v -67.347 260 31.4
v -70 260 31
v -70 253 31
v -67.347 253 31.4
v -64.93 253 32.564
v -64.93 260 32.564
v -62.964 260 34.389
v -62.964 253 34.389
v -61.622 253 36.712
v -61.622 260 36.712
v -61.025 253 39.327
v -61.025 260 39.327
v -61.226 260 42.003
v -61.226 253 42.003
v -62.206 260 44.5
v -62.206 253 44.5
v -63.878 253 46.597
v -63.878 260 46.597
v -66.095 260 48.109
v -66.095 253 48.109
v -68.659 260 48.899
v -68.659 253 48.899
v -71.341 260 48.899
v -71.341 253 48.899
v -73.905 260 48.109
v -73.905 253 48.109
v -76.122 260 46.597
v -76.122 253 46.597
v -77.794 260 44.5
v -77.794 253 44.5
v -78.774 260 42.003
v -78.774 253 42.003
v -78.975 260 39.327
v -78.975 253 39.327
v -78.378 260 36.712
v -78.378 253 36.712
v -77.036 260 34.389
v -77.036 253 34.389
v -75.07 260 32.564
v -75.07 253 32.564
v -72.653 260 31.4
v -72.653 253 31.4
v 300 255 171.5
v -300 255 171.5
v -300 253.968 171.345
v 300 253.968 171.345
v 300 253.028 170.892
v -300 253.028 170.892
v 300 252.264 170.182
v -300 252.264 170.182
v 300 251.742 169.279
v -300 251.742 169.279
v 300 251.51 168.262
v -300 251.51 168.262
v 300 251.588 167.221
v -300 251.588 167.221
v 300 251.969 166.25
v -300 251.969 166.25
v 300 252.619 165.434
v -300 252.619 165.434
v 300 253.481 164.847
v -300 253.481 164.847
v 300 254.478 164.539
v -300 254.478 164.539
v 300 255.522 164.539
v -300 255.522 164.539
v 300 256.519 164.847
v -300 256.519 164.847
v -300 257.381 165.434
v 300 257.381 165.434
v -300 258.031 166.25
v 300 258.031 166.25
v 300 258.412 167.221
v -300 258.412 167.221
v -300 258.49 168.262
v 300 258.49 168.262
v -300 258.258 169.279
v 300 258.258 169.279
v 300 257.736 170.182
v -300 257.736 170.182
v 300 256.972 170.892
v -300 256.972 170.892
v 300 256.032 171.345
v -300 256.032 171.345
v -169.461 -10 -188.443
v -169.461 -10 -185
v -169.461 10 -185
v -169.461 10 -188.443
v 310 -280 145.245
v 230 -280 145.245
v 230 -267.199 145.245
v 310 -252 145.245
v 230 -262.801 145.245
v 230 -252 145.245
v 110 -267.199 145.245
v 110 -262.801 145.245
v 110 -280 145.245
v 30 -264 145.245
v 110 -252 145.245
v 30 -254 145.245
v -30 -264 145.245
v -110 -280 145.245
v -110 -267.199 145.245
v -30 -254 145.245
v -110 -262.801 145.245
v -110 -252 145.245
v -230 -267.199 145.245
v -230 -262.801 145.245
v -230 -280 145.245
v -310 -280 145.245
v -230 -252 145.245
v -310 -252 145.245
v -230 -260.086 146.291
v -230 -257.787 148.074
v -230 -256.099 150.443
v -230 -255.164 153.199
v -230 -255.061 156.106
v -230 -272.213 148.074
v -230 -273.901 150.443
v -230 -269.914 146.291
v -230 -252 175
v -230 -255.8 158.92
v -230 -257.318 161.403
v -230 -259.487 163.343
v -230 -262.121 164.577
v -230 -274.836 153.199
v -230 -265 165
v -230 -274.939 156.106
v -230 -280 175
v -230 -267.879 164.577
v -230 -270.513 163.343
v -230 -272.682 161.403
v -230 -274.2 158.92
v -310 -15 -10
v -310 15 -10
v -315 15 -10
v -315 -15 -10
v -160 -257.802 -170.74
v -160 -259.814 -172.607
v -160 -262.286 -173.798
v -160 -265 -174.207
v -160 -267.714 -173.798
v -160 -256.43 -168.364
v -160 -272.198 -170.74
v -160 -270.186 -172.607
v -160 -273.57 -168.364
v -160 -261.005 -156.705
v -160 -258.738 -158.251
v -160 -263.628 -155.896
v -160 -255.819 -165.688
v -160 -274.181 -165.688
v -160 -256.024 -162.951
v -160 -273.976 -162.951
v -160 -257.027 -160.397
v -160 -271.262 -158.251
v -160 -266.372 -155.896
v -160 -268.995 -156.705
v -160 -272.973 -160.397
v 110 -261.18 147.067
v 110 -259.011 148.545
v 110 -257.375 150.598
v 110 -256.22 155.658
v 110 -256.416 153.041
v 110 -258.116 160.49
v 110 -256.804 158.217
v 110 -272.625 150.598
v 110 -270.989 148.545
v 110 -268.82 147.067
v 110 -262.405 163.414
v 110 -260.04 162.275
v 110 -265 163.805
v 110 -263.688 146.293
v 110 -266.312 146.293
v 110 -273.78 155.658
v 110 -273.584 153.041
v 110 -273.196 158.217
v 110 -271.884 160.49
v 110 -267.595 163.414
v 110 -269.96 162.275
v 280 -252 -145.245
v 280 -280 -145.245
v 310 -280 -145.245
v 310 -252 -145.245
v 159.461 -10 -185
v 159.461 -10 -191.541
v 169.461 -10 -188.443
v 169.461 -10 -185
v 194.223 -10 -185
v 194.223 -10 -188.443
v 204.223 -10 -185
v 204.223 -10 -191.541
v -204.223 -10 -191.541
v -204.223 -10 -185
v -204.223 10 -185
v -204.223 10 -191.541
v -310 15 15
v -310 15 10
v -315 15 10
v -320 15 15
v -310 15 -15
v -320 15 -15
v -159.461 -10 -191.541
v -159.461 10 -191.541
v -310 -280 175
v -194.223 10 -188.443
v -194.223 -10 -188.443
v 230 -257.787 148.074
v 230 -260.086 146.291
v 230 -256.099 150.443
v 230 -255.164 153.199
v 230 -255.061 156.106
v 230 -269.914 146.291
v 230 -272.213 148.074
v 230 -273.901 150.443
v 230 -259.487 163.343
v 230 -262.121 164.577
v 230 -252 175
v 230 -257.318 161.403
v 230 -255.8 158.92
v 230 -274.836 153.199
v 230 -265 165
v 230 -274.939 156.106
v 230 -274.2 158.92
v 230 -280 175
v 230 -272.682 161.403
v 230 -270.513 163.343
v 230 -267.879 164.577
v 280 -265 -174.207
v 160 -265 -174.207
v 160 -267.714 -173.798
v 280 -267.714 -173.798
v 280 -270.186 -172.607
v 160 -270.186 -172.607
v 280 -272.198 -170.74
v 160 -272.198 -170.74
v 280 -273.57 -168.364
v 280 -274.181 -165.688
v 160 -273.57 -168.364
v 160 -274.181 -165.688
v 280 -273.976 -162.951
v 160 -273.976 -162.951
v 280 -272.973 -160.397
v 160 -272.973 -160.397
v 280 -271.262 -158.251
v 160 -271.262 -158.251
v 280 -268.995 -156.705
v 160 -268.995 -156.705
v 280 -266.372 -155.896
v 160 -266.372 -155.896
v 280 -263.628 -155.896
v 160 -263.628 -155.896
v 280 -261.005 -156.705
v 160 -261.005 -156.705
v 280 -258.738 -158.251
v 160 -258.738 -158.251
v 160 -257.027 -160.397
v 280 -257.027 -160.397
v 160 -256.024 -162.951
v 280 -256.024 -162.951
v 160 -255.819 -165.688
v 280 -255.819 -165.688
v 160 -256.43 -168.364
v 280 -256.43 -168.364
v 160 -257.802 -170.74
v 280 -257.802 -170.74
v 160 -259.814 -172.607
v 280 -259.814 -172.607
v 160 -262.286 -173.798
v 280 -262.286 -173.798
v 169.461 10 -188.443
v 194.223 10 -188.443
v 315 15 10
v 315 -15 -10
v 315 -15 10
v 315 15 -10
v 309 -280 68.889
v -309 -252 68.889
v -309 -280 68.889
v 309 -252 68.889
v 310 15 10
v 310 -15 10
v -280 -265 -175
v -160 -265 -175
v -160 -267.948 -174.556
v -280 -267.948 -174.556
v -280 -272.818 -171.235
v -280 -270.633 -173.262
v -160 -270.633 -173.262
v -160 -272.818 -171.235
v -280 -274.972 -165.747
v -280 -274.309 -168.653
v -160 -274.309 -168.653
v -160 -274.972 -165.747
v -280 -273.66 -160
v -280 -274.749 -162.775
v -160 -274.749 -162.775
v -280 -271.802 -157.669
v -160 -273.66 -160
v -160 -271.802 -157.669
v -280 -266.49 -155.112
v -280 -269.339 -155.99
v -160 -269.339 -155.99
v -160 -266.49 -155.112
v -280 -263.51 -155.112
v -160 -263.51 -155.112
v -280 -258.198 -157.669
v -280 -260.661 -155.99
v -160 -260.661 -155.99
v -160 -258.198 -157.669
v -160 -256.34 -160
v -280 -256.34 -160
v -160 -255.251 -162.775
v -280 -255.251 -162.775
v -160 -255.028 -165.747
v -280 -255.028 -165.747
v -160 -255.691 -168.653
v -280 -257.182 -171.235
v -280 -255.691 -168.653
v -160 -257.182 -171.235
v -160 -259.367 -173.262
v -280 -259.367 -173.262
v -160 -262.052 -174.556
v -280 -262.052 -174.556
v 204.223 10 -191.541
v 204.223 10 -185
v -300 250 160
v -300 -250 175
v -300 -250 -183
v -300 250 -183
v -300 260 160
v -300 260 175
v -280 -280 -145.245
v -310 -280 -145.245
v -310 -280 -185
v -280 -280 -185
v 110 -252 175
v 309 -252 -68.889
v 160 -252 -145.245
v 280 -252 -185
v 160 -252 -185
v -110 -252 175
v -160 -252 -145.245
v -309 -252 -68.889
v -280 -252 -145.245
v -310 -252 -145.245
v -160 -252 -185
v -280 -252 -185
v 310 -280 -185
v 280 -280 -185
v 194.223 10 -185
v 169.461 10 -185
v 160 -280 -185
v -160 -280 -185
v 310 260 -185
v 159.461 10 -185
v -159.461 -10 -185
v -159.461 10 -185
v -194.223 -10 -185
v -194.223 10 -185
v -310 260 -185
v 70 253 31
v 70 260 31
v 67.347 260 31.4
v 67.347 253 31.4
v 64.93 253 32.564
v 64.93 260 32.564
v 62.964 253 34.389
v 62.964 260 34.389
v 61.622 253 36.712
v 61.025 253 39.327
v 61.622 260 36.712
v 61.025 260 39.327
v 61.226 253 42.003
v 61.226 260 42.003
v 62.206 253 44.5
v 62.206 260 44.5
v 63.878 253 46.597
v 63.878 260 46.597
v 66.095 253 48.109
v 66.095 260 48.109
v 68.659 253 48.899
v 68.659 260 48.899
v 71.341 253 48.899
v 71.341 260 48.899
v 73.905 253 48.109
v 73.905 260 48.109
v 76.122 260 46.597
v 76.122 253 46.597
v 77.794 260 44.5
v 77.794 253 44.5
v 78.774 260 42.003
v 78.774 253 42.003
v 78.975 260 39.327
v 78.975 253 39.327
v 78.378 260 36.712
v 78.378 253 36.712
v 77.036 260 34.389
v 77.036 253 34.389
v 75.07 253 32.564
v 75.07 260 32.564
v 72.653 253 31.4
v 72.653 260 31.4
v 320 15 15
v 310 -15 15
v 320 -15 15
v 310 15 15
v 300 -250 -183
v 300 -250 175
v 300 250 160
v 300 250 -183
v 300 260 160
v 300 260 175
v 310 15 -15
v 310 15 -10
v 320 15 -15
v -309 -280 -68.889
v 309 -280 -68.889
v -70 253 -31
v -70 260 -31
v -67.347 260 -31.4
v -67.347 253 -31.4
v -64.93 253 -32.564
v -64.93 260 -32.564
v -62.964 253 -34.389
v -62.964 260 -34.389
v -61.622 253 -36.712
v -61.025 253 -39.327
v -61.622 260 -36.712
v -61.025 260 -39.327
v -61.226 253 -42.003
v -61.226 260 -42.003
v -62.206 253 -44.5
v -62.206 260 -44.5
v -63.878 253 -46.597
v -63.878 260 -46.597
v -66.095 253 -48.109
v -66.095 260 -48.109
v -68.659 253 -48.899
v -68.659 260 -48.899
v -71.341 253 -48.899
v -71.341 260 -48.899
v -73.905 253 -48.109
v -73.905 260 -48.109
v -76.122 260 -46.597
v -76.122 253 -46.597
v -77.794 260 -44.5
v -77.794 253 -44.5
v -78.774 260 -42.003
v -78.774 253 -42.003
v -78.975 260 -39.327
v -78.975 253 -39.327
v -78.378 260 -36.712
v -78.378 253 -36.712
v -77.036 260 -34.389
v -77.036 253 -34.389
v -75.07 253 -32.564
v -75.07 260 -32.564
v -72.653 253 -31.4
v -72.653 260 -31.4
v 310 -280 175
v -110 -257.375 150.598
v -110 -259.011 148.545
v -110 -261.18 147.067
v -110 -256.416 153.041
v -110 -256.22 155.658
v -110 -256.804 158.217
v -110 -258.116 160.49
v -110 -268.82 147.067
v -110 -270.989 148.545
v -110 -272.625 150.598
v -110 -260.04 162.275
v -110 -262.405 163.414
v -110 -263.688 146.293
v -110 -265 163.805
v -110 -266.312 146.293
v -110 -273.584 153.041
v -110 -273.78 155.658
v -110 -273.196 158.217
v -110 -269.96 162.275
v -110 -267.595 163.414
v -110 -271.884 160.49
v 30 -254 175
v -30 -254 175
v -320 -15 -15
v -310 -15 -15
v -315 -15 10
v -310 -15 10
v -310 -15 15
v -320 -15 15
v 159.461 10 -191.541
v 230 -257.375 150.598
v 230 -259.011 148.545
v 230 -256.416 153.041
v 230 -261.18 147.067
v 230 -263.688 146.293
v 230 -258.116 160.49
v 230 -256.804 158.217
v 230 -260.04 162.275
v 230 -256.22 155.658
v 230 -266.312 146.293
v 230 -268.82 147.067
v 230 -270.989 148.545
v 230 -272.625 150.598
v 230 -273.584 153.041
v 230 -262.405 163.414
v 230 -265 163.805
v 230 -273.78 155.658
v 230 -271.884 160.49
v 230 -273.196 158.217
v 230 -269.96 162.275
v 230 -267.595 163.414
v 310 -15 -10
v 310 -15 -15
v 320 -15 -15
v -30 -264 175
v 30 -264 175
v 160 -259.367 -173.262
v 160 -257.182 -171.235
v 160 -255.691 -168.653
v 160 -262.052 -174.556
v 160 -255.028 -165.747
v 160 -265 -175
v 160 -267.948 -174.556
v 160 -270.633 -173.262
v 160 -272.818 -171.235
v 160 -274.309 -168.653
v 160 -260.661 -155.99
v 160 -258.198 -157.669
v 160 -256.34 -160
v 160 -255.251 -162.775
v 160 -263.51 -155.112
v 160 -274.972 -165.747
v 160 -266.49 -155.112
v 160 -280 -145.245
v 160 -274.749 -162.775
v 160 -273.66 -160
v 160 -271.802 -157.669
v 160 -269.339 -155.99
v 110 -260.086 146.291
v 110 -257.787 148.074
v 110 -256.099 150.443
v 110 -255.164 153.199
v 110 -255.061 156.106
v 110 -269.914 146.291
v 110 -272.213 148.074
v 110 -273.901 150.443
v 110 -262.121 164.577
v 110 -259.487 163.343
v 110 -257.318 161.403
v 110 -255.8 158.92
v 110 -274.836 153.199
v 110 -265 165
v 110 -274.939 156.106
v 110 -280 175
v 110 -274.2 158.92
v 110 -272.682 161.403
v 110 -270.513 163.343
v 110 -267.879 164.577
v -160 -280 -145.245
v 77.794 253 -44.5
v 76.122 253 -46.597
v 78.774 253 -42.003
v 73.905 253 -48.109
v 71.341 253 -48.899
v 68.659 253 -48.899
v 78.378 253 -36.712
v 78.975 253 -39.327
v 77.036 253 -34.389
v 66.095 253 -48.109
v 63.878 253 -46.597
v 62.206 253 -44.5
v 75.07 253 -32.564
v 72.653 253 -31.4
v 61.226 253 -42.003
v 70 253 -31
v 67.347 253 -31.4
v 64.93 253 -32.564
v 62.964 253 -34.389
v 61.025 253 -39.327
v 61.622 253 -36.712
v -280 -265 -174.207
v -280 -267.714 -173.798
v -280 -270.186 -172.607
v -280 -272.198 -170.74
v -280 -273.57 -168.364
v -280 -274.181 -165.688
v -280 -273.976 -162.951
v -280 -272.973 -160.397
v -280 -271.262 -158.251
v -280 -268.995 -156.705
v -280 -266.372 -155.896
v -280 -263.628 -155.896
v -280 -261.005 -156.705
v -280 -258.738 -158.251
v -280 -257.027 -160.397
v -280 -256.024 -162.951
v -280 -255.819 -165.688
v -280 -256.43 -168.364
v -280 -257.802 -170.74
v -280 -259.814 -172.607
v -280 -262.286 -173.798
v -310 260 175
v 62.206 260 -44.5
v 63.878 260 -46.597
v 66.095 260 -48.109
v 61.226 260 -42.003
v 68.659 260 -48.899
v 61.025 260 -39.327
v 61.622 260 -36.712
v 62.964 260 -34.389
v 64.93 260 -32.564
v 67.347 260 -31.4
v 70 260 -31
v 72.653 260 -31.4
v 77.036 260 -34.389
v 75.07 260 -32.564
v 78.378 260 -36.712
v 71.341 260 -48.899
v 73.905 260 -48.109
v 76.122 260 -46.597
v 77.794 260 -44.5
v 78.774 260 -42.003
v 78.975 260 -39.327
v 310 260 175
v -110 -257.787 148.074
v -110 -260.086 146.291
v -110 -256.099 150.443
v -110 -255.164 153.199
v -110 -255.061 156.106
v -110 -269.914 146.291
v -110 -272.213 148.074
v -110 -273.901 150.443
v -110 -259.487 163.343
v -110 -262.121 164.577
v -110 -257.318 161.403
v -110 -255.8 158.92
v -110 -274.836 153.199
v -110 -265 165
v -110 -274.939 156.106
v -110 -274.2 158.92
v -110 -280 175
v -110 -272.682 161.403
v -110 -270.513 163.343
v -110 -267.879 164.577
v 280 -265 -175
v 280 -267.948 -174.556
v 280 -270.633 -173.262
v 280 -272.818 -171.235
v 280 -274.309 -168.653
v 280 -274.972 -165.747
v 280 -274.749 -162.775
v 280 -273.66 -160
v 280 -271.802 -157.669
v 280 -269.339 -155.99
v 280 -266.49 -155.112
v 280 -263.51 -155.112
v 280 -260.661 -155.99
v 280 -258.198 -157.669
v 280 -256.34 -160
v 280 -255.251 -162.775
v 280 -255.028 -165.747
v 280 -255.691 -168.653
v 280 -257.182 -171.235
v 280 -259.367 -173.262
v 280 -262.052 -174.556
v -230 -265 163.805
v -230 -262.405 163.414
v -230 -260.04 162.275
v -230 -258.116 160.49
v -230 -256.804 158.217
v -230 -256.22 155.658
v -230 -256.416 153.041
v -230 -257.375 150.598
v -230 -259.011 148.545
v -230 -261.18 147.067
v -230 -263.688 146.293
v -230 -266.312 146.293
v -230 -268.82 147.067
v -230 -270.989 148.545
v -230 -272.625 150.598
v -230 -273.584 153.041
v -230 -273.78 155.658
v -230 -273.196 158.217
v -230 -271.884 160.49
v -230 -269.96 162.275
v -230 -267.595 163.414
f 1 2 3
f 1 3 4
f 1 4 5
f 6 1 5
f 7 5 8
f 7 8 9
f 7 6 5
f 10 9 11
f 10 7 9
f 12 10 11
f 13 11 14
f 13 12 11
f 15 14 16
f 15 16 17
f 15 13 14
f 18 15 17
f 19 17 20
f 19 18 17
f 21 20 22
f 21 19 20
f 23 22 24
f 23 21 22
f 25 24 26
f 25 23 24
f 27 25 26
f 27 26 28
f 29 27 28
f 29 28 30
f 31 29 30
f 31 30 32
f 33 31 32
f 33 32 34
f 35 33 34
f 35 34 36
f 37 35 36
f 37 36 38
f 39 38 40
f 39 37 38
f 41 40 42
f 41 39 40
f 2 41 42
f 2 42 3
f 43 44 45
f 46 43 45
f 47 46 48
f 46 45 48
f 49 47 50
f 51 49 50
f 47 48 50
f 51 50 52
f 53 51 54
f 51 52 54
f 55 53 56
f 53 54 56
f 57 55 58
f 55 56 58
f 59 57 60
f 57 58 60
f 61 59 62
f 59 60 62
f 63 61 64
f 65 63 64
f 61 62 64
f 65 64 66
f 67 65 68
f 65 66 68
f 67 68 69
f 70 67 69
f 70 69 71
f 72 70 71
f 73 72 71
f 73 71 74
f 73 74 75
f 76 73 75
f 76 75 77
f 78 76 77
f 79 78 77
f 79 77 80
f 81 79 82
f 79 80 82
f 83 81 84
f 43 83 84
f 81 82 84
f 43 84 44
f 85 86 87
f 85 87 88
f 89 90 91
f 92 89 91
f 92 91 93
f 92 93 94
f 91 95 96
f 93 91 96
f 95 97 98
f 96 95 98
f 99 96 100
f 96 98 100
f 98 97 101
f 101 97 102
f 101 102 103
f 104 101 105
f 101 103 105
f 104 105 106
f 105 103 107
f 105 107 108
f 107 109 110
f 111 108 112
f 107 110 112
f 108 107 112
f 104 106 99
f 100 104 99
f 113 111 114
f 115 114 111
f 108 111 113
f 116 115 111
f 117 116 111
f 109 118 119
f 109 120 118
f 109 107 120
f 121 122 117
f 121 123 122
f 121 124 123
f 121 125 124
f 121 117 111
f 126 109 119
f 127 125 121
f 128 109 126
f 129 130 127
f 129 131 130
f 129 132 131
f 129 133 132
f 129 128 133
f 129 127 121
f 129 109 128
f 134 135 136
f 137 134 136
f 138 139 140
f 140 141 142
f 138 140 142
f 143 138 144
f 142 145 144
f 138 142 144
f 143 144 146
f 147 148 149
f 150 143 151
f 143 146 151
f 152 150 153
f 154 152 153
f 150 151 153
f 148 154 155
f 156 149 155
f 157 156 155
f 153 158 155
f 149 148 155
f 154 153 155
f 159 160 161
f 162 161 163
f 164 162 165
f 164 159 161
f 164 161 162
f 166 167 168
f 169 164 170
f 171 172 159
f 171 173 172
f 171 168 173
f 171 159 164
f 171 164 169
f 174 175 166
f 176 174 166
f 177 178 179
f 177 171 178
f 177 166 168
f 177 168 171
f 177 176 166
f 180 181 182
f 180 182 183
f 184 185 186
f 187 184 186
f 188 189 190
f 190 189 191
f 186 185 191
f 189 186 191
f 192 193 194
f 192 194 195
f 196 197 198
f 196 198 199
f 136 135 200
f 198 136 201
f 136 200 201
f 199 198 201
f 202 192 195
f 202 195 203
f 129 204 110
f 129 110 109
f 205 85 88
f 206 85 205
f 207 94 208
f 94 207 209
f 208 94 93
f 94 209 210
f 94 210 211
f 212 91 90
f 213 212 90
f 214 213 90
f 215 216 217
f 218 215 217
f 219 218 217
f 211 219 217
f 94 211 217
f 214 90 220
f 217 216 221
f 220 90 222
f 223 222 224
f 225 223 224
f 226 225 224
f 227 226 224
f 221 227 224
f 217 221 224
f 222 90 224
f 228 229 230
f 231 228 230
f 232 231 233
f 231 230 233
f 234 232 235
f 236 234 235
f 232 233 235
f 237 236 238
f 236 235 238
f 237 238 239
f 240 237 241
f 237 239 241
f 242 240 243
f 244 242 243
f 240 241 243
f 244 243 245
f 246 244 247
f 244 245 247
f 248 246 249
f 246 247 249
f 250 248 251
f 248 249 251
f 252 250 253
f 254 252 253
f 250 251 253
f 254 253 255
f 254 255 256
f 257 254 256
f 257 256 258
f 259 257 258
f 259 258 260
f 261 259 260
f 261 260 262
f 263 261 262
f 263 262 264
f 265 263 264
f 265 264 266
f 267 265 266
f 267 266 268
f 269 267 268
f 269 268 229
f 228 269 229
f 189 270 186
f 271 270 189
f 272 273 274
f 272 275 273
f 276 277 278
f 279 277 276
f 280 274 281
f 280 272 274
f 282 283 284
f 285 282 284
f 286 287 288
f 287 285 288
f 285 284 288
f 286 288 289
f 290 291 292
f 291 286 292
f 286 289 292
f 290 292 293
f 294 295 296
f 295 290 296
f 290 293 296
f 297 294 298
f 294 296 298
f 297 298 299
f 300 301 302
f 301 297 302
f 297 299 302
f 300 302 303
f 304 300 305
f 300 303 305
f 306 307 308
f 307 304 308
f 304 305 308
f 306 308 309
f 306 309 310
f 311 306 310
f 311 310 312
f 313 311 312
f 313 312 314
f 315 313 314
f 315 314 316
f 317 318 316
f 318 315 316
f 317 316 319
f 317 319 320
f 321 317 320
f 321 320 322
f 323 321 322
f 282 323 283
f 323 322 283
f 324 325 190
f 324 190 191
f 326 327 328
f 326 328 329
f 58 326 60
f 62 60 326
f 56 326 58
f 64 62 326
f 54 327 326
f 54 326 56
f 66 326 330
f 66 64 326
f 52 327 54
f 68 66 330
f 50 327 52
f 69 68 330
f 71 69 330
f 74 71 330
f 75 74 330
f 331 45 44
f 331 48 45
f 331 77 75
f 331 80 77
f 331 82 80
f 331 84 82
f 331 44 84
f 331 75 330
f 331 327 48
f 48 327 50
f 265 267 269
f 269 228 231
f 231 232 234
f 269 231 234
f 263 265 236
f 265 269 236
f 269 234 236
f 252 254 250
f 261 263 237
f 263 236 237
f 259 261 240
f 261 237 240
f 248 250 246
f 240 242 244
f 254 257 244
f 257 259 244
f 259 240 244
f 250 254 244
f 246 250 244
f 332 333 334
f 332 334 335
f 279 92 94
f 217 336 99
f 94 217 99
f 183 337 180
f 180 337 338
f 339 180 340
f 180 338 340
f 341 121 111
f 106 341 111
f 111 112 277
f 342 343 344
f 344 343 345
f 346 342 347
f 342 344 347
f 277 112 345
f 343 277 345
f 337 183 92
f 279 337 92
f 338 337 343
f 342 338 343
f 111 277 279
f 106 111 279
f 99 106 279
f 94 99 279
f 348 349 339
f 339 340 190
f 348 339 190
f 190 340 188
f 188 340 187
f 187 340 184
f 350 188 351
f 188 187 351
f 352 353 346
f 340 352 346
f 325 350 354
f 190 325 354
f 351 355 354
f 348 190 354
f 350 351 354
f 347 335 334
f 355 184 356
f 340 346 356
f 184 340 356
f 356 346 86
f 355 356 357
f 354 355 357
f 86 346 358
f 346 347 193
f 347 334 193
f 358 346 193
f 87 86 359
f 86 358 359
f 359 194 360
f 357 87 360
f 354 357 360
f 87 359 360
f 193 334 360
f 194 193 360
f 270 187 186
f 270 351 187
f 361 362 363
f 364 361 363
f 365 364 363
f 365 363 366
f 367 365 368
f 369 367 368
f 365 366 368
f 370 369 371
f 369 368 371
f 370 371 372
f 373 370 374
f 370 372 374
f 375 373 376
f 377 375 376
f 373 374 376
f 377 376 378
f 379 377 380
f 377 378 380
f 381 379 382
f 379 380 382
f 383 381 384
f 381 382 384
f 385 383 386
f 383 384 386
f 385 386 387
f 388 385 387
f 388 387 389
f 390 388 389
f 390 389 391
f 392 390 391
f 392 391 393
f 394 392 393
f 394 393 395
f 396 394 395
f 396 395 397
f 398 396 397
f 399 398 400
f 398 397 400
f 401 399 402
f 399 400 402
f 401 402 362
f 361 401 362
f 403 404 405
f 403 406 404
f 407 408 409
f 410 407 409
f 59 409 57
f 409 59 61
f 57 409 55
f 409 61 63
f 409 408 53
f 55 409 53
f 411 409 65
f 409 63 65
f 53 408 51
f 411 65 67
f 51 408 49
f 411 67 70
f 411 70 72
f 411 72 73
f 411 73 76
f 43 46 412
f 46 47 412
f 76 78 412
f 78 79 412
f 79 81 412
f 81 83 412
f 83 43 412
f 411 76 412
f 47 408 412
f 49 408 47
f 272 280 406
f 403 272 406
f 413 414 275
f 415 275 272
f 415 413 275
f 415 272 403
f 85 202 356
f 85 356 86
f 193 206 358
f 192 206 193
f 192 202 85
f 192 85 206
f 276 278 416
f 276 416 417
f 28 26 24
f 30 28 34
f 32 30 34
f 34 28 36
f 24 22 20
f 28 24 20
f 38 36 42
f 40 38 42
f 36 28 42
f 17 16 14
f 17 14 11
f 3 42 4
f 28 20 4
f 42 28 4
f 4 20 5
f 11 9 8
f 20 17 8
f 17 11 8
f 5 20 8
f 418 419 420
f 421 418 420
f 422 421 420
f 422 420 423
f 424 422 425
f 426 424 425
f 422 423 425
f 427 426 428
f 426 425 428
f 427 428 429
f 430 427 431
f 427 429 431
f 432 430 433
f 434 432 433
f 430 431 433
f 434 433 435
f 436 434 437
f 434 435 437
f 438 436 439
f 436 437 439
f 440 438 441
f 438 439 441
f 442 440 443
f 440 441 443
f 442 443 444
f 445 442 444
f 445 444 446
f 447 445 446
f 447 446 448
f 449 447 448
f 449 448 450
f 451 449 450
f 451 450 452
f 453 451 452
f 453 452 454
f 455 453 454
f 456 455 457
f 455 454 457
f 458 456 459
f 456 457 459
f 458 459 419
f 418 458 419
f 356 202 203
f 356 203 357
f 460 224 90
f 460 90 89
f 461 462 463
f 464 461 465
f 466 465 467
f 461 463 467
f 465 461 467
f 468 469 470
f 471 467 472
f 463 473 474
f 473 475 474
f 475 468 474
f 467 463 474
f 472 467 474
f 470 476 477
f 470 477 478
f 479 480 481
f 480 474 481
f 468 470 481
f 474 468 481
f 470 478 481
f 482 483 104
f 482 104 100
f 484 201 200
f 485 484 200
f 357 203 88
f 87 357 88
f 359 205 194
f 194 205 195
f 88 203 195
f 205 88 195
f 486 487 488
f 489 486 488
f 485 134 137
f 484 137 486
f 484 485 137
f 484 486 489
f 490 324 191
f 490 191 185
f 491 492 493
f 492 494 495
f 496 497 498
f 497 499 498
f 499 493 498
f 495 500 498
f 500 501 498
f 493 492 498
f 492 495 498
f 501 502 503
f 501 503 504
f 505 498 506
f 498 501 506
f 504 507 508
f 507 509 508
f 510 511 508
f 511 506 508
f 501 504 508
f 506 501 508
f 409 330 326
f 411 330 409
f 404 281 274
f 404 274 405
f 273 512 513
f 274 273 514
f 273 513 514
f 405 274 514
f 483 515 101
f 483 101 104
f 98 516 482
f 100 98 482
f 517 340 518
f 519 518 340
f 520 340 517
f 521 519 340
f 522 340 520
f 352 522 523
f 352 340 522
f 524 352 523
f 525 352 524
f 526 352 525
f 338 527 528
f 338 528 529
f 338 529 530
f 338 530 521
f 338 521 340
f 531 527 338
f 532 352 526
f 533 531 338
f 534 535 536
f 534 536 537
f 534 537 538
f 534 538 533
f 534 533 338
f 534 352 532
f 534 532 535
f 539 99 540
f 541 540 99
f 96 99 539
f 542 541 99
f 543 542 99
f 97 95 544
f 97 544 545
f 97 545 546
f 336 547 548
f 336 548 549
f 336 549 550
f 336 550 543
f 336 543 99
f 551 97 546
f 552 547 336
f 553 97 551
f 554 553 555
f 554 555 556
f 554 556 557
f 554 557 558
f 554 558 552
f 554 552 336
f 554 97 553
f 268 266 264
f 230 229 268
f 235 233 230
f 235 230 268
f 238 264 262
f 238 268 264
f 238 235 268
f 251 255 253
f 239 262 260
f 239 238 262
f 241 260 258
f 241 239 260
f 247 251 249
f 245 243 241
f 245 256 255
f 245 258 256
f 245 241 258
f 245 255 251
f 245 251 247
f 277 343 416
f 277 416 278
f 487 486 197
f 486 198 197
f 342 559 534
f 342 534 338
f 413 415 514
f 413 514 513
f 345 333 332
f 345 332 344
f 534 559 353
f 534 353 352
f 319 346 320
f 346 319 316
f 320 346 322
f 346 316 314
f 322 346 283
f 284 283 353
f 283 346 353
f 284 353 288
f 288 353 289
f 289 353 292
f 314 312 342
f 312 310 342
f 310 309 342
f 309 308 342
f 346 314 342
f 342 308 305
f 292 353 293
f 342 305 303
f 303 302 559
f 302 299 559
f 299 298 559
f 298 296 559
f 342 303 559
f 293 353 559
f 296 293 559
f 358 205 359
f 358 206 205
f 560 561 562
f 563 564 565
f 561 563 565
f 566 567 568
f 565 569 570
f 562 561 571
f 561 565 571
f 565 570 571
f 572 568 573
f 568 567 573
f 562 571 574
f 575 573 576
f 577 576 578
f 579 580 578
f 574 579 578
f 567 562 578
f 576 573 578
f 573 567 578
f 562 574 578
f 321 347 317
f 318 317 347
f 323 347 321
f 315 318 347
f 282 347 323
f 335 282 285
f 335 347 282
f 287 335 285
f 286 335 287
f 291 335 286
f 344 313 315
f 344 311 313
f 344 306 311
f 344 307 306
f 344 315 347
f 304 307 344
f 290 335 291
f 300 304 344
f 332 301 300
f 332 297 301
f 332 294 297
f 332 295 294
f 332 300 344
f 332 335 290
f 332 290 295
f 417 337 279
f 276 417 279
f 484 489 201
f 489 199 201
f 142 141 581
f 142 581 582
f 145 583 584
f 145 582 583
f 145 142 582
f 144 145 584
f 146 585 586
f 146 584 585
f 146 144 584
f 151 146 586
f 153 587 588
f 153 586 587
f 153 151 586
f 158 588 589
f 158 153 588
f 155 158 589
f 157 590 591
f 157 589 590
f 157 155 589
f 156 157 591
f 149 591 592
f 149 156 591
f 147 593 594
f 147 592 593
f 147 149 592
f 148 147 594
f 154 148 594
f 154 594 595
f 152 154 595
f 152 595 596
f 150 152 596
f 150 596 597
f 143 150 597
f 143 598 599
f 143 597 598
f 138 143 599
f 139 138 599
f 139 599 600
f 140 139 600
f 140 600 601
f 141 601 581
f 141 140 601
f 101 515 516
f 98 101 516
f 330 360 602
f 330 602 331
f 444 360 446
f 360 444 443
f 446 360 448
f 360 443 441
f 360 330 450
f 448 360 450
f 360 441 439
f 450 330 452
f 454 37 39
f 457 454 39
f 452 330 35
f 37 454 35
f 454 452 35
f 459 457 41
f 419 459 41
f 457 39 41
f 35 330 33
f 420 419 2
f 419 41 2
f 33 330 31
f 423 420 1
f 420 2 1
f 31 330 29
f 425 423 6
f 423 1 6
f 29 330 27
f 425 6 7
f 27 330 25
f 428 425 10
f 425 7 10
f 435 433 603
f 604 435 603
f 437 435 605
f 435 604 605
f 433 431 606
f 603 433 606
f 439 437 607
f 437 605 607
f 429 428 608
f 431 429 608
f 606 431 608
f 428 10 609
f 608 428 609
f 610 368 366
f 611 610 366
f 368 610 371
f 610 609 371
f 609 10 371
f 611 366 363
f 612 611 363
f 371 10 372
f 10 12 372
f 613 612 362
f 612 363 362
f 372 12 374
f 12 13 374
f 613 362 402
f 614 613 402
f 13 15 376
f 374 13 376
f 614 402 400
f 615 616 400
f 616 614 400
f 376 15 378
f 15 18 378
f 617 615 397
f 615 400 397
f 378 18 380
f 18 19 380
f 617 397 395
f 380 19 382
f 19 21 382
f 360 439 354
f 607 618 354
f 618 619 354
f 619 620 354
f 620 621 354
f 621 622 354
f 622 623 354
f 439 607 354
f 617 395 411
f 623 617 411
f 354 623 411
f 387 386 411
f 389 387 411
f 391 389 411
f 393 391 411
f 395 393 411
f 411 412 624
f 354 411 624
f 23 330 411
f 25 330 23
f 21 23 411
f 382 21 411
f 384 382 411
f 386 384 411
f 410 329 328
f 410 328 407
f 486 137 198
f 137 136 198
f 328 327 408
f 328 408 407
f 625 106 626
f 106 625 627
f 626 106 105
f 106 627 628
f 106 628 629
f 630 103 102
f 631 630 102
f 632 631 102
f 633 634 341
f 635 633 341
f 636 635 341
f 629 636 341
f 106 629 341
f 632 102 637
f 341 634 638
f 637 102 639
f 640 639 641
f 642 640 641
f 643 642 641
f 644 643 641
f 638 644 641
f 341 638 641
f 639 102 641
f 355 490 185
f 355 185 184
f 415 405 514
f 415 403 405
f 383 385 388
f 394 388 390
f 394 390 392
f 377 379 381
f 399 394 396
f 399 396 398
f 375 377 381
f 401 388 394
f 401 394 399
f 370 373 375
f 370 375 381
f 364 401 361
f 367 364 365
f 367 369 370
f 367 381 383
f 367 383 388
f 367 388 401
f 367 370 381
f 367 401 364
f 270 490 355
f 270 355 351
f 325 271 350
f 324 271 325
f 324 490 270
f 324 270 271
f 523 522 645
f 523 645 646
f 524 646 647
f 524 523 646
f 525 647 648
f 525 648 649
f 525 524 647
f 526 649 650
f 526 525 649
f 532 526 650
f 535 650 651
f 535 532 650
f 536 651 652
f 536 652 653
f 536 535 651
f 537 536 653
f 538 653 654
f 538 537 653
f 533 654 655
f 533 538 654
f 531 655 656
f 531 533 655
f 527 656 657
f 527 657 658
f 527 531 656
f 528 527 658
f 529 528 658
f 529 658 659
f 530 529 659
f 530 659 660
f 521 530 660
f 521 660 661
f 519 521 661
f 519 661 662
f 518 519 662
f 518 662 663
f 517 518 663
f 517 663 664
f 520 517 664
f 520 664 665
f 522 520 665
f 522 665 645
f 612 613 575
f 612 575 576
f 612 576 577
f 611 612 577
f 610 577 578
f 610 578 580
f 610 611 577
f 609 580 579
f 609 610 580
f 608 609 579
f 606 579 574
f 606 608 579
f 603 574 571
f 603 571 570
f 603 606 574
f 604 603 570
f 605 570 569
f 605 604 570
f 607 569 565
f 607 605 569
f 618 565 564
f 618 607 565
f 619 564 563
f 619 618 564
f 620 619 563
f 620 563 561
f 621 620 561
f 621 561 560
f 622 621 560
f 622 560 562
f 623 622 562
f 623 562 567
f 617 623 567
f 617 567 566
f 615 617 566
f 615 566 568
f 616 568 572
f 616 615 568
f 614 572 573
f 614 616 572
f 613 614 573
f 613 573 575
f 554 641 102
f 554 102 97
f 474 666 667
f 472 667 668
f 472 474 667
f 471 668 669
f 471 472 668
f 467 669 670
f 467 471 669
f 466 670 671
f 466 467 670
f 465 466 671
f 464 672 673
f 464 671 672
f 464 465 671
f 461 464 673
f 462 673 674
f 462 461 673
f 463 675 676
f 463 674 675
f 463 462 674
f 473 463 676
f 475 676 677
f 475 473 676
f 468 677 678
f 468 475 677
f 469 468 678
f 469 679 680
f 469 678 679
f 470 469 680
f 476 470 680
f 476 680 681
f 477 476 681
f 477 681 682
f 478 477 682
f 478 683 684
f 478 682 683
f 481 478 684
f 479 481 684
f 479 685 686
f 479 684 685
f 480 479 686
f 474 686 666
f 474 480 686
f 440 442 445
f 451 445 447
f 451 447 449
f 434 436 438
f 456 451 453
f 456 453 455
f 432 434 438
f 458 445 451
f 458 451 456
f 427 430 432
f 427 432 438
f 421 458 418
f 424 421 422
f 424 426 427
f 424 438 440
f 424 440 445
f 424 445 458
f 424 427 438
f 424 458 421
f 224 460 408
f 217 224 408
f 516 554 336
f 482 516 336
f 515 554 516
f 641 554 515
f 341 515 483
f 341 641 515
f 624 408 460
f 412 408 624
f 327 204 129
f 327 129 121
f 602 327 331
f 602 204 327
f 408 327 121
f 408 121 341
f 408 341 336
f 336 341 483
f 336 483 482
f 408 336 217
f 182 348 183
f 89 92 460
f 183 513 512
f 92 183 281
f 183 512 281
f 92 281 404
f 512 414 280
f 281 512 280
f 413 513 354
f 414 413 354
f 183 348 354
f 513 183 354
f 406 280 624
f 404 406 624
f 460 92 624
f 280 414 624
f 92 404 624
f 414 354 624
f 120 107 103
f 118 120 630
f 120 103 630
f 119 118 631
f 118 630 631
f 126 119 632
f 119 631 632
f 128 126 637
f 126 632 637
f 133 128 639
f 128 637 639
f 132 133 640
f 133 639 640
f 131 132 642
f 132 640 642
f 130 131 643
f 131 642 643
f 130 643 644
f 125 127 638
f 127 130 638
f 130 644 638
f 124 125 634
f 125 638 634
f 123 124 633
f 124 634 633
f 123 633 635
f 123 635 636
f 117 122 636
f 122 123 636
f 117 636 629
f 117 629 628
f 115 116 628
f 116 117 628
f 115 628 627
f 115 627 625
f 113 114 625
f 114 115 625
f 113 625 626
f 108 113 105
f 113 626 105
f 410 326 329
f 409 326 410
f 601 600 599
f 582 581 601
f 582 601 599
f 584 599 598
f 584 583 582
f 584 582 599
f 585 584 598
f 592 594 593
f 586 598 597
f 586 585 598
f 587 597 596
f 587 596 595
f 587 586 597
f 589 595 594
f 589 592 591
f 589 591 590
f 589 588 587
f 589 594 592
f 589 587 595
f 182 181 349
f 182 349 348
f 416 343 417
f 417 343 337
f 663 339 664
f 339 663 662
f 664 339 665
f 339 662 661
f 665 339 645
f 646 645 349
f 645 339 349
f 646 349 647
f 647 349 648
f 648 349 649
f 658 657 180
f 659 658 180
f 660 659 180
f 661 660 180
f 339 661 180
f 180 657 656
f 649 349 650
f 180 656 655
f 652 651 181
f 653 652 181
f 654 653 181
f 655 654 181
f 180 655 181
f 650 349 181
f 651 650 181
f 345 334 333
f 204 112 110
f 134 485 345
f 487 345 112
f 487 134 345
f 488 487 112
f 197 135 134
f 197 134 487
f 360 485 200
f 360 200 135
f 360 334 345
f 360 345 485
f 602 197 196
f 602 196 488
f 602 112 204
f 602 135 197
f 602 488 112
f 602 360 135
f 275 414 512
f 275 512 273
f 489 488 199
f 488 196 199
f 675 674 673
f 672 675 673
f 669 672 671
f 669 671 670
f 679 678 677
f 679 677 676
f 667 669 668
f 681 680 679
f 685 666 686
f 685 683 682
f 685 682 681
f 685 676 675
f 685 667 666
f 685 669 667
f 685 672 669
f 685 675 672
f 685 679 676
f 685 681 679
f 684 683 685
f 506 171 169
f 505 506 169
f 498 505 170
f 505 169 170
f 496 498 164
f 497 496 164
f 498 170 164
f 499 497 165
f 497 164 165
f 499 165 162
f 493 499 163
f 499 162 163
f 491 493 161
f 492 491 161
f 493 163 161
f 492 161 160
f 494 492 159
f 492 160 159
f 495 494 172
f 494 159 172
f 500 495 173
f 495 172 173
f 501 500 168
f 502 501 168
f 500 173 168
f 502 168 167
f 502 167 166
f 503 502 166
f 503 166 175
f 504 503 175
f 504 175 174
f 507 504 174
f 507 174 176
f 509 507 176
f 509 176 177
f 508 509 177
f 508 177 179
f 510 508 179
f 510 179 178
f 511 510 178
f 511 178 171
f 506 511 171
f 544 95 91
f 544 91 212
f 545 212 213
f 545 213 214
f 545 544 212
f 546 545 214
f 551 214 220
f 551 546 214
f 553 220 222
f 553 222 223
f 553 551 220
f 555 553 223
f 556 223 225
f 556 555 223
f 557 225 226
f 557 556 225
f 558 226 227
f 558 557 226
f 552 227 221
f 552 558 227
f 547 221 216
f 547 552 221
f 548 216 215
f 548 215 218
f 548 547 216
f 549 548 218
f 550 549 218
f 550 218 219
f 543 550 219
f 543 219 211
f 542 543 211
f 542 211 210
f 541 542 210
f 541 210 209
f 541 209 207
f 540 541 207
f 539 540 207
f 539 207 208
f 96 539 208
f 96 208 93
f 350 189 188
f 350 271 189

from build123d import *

# Parameters (mm, degrees)
SKETCH1_W                                  = 600
SKETCH1_H                                  = 500
BOSS_EXTRUDE1_DEPTH                        = 175
SHELL1_T                                   = 10
SKETCH3_W                                  = 620
SKETCH3_H                                  = 360
BOSS_EXTRUDE2_DEPTH                        = 20
SKETCH5_W                                  = 120
SKETCH5_H                                  = 150
CUT_EXTRUDE1_DEPTH                         = 50
BOSS_EXTRUDE3_DEPTH                        = 15
SKETCH9_R                                  = 10
SKETCH9_R_2                                = 8.804977656
SKETCH9_R_3                                = 9.206937975
BOSS_EXTRUDE4_DEPTH                        = 180
BOSS_EXTRUDE8_START                        = -260
BOSS_EXTRUDE8_DEPTH                        = 10
SKETCH147_W                                = 600
SKETCH147_H                                = 15
CUT_EXTRUDE2_DEPTH                         = 10
SKETCH148_R                                = 3.5
BOSS_EXTRUDE10_DEPTH                       = 600
SKETCH149_R                                = 9
CUT_EXTRUDE3_DEPTH                         = 7
MIRROR3_AT_THE_SECOND_PLANE_COPY_1_SKETC_R = 9
MIRROR3_AT_THE_SECOND_PLANE_COPY_1_DEPTH   = 7
SKETCH150_W                                = 60
SKETCH150_H                                = 10
CUT_EXTRUDE4_DEPTH                         = 30
SKETCH155_W                                = 290.489530142
SKETCH155_H                                = 28
CUT_EXTRUDE11_DEPTH                        = 716.53321378
BOSS_EXTRUDE11_DEPTH                       = 488
BOSS_EXTRUDE12_DEPTH                       = 125
BOSS_EXTRUDE12_DEPTH_BACK                  = 445
SKETCH160_W                                = 600
SKETCH160_H                                = 500
CUT_EXTRUDE12_DEPTH                        = 8
SKETCH161_W                                = 618
SKETCH161_H                                = 137.7775458
BOSS_EXTRUDE13_DEPTH                       = 28


with BuildPart() as part:
    # Sketch1 → Boss-Extrude1 (new, symmetric)
    with BuildSketch(Plane.XY):
        Rectangle(SKETCH1_W, SKETCH1_H)
    extrude(amount=BOSS_EXTRUDE1_DEPTH, both=True)

    # Shell1
    shell1_openings = [part.faces().sort_by_distance(p)[0] for p in [
        (0, 0, 175),
    ]]
    offset(amount=SHELL1_T, openings=shell1_openings, kind=Kind.INTERSECTION)

    # Sketch3 → Boss-Extrude2 (add)
    with BuildSketch(Plane.XZ.offset(260)):
        with Locations((0, -5)):
            Rectangle(SKETCH3_W, SKETCH3_H)
    extrude(amount=BOSS_EXTRUDE2_DEPTH)

    # Sketch5 → Cut-Extrude1 (cut)
    with BuildSketch(Plane.XZ.offset(280)):
        with Locations((-170, 100)):
            Rectangle(SKETCH5_W, SKETCH5_H)
        with Locations((170, 100)):
            Rectangle(SKETCH5_W, SKETCH5_H)
        with Locations((-220, -185)):
            Rectangle(SKETCH5_W, SKETCH5_H)
        with Locations((220, -185)):
            Rectangle(SKETCH5_W, SKETCH5_H)
    extrude(amount=-CUT_EXTRUDE1_DEPTH, mode=Mode.SUBTRACT)

    # Sketch8 → Boss-Extrude3 (add, symmetric)
    with BuildSketch(Plane(origin=(0, 0, 0), x_dir=(1, 0, 0), z_dir=(0, 1, 0))):
        Polygon((-310, 10), (-315, 10), (-315, -10), (-310, -10), (-310, -15), (-320, -15), (-320, 15), (-310, 15), align=None)
    boss_extrude3 = extrude(amount=BOSS_EXTRUDE3_DEPTH, both=True)

    # Sketch9 → Boss-Extrude4 (add)
    # profile 1 of 2: a face of its own
    with BuildSketch(Plane.ZY.offset(110)):
        with Locations(Location((155, -265, 0), (0, 0, 180))):
            Circle(SKETCH9_R)
        with Locations((155, -265)):
            Circle(SKETCH9_R_2, mode=Mode.SUBTRACT)
    # profile 2 of 2: a face of its own
    with BuildSketch(Plane.ZY.offset(110)):
        with Locations(Location((-165, -265, 0), (0, 0, 180))):
            Circle(SKETCH9_R)
        with Locations(Location((-165, -265, 0), (0, 0, 180))):
            Circle(SKETCH9_R_3, mode=Mode.SUBTRACT)
    boss_extrude4 = extrude(amount=BOSS_EXTRUDE4_DEPTH)

    # Mirror1: Boss-Extrude3, Boss-Extrude4 across plane
    add(boss_extrude3.mirror(Plane(origin=(0, 0, 0), x_dir=(0, 0, 1), z_dir=(1, 0, 0))))
    add(boss_extrude4.mirror(Plane(origin=(0, 0, 0), x_dir=(0, 0, 1), z_dir=(1, 0, 0))))

    # Sketch17 → Boss-Extrude8 (add, symmetric)
    with BuildSketch(Plane(origin=(0, 260, 0), x_dir=(1, 0, 0), z_dir=(0, 1, 0)).offset(BOSS_EXTRUDE8_START)):
        Polygon((-194.223256177, 185), (-204.223256177, 185), (-204.223256177, 191.540544069), (-159.461030104, 191.540544069), (-159.461030104, 185), (-169.461030104, 185), (-169.461030104, 188.442858537), (-194.223256177, 188.442858537), align=None)
        Polygon((194.223256177, 188.442858537), (194.223256177, 185), (204.223256177, 185), (204.223256177, 191.540544069), (159.461030104, 191.540544069), (159.461030104, 185), (169.461030104, 185), (169.461030104, 188.442858537), align=None)
    extrude(amount=BOSS_EXTRUDE8_DEPTH, both=True)

    # Sketch147 → Cut-Extrude2 (cut)
    with BuildSketch(Plane(origin=(0, 260, 0), x_dir=(1, 0, 0), z_dir=(0, 1, 0))):
        with Locations((0, -167.5)):
            Rectangle(SKETCH147_W, SKETCH147_H)
    extrude(amount=-CUT_EXTRUDE2_DEPTH, mode=Mode.SUBTRACT)

    # Sketch148 → Boss-Extrude10 (add)
    with BuildSketch(Plane(origin=(-300, 0, 0), x_dir=(0, 0, -1), z_dir=(1, 0, 0))):
        with Locations(Location((-168, 255, 0), (0, 0, 180))):
            Circle(SKETCH148_R)
    extrude(amount=BOSS_EXTRUDE10_DEPTH)

    # Sketch149 → Cut-Extrude3 (cut)
    with BuildSketch(Plane(origin=(0, 260, 0), x_dir=(1, 0, 0), z_dir=(0, 1, 0))):
        with Locations(Location((-70, 40, 0), (0, 0, 270))):
            Circle(SKETCH149_R)
    cut_extrude3 = extrude(amount=-CUT_EXTRUDE3_DEPTH, mode=Mode.SUBTRACT)

    # Mirror3: Cut-Extrude3 across plane
    add(cut_extrude3.mirror(Plane.XY), mode=Mode.SUBTRACT)

    # Mirror3 at the second plane: Cut-Extrude3 across plane
    add(cut_extrude3.mirror(Plane(origin=(0, 0, 0), x_dir=(0, 0, 1), z_dir=(1, 0, 0))), mode=Mode.SUBTRACT)

    # Mirror3 at the second plane copy 1 sketc → Mirror3 at the second plane copy 1 (cut)
    with BuildSketch(Plane(origin=(0, 260, 0), x_dir=(-1, 0, 0), z_dir=(0, 1, 0))):
        with Locations(Location((-70, 40, 0), (0, 0, 270))):
            Circle(MIRROR3_AT_THE_SECOND_PLANE_COPY_1_SKETC_R)
    extrude(amount=-MIRROR3_AT_THE_SECOND_PLANE_COPY_1_DEPTH, mode=Mode.SUBTRACT)

    # Sketch150 → Cut-Extrude4 (cut)
    with BuildSketch(Plane.XY.offset(175)):
        with Locations((0, -259)):
            Rectangle(SKETCH150_W, SKETCH150_H)
    extrude(amount=-CUT_EXTRUDE4_DEPTH, mode=Mode.SUBTRACT)

    # Sketch155 → Cut-Extrude11 (cut, through all)
    with BuildSketch(Plane.ZY.offset(310)):
        with Locations((0, -266)):
            Rectangle(SKETCH155_W, SKETCH155_H)
    extrude(amount=-CUT_EXTRUDE11_DEPTH, mode=Mode.SUBTRACT)

    # Sketch157 → Boss-Extrude11 (add)
    with BuildSketch(Plane(origin=(-230, 0, 0), x_dir=(0, 0, -1), z_dir=(1, 0, 0))):
        Polygon((-145.244765071, -252), (-175, -252), (-175, -250), (-25, -250), (-25, -252), align=None)
    extrude(amount=BOSS_EXTRUDE11_DEPTH)

    # Sketch159 → Boss-Extrude12 (add, two sides: drawn at the far end of the back side and taken through both)
    with BuildSketch(Plane(origin=(160, 0, 0), x_dir=(0, 0, -1), z_dir=(1, 0, 0)).offset(-BOSS_EXTRUDE12_DEPTH_BACK)):
        Polygon((145.244765071, -252), (185, -252), (185, -230), (175, -230), (175, -250), (110, -250), (110, -252), align=None)
    extrude(amount=BOSS_EXTRUDE12_DEPTH + BOSS_EXTRUDE12_DEPTH_BACK)

    # Sketch160 → Cut-Extrude12 (cut)
    with BuildSketch(Plane.XY.offset(-175)):
        Rectangle(SKETCH160_W, SKETCH160_H)
    extrude(amount=-CUT_EXTRUDE12_DEPTH, mode=Mode.SUBTRACT)

    # Sketch161 → Boss-Extrude13 (add)
    with BuildSketch(Plane.XZ.offset(252)):
        Rectangle(SKETCH161_W, SKETCH161_H)
    extrude(amount=BOSS_EXTRUDE13_DEPTH)


solid = part.part
